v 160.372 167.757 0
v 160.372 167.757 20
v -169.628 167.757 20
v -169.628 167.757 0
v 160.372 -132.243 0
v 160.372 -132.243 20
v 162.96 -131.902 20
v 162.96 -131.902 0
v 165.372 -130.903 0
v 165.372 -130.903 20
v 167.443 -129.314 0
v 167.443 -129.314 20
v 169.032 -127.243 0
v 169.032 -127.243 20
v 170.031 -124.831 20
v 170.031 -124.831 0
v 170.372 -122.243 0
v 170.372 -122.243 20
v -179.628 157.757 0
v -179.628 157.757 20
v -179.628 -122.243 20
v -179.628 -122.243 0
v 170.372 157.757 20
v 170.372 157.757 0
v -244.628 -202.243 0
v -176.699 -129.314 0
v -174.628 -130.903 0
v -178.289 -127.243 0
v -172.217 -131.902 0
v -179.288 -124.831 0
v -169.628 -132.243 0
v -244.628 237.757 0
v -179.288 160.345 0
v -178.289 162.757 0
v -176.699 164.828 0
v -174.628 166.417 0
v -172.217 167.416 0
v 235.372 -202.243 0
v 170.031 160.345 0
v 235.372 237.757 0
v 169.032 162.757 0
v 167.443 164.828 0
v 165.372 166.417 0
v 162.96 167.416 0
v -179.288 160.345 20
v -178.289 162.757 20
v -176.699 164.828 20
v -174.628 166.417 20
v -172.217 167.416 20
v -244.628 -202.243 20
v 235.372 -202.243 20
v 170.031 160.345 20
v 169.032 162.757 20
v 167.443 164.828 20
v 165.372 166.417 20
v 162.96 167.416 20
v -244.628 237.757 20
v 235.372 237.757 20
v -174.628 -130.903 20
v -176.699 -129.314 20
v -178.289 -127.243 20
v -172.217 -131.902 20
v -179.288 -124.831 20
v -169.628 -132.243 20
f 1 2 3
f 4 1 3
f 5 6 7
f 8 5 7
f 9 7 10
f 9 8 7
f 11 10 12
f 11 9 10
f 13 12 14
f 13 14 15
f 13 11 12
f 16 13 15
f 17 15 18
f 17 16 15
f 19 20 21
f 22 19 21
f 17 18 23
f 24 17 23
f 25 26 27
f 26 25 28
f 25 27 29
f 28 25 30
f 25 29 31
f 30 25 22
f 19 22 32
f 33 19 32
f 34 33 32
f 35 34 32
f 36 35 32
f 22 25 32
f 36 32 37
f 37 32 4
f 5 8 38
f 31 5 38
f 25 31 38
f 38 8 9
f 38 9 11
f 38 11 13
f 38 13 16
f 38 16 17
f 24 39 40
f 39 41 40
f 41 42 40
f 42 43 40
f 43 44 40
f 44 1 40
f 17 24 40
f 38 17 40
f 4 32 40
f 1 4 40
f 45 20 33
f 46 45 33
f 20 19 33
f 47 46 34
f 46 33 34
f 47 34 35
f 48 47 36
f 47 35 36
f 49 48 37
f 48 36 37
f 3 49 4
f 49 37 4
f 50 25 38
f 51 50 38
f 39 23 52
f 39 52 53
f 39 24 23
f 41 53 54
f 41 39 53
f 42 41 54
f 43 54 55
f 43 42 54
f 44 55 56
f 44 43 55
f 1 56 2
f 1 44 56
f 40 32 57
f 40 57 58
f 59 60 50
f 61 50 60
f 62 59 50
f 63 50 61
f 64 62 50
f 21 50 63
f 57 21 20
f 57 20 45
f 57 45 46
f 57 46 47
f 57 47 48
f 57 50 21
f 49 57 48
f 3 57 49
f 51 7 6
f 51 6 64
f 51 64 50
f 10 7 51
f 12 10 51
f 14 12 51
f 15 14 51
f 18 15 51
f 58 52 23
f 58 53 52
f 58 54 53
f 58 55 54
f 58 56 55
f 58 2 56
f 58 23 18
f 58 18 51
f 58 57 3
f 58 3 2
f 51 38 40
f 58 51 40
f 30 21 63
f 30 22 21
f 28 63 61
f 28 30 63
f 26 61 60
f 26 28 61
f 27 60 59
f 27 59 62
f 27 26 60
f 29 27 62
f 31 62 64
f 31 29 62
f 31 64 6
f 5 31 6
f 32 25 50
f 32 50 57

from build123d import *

# Parameters (mm, degrees)
F0_W     = 480
F0_H     = 440
F1_DEPTH = 20
F2_W     = 175
F2_H     = 150
F3_DEPTH = 20
F4_R     = 10


with BuildPart() as f1:
    # F0 (on Top) → F1 (new body)
    with BuildSketch(Plane.XY):
        with Locations((-4.628388, 17.757134)):
            Rectangle(F0_W, F0_H)
    extrude(amount=F1_DEPTH)

    # F2 (on face) → F3 (cut, through all)
    with BuildSketch(Plane.XY.offset(20)):
        with Locations((-92.128388, 92.757134)):
            Rectangle(F2_W, F2_H)
        with Locations((82.871612, 92.757134)):
            Rectangle(F2_W, F2_H)
        with Locations((-92.128388, -57.242866)):
            Rectangle(F2_W, F2_H)
        with Locations((82.871612, -57.242866)):
            Rectangle(F2_W, F2_H)
    extrude(amount=-F3_DEPTH, mode=Mode.SUBTRACT)

    # F4
    f4_edges = [f1.edges().sort_by_distance(p)[0] for p in [
        (-179.628388, 167.757134, 10),
        (-179.628388, -132.242866, 10),
        (170.371612, 167.757134, 10),
        (170.371612, -132.242866, 10),
    ]]
    fillet(f4_edges, radius=F4_R)


solid = f1.part
